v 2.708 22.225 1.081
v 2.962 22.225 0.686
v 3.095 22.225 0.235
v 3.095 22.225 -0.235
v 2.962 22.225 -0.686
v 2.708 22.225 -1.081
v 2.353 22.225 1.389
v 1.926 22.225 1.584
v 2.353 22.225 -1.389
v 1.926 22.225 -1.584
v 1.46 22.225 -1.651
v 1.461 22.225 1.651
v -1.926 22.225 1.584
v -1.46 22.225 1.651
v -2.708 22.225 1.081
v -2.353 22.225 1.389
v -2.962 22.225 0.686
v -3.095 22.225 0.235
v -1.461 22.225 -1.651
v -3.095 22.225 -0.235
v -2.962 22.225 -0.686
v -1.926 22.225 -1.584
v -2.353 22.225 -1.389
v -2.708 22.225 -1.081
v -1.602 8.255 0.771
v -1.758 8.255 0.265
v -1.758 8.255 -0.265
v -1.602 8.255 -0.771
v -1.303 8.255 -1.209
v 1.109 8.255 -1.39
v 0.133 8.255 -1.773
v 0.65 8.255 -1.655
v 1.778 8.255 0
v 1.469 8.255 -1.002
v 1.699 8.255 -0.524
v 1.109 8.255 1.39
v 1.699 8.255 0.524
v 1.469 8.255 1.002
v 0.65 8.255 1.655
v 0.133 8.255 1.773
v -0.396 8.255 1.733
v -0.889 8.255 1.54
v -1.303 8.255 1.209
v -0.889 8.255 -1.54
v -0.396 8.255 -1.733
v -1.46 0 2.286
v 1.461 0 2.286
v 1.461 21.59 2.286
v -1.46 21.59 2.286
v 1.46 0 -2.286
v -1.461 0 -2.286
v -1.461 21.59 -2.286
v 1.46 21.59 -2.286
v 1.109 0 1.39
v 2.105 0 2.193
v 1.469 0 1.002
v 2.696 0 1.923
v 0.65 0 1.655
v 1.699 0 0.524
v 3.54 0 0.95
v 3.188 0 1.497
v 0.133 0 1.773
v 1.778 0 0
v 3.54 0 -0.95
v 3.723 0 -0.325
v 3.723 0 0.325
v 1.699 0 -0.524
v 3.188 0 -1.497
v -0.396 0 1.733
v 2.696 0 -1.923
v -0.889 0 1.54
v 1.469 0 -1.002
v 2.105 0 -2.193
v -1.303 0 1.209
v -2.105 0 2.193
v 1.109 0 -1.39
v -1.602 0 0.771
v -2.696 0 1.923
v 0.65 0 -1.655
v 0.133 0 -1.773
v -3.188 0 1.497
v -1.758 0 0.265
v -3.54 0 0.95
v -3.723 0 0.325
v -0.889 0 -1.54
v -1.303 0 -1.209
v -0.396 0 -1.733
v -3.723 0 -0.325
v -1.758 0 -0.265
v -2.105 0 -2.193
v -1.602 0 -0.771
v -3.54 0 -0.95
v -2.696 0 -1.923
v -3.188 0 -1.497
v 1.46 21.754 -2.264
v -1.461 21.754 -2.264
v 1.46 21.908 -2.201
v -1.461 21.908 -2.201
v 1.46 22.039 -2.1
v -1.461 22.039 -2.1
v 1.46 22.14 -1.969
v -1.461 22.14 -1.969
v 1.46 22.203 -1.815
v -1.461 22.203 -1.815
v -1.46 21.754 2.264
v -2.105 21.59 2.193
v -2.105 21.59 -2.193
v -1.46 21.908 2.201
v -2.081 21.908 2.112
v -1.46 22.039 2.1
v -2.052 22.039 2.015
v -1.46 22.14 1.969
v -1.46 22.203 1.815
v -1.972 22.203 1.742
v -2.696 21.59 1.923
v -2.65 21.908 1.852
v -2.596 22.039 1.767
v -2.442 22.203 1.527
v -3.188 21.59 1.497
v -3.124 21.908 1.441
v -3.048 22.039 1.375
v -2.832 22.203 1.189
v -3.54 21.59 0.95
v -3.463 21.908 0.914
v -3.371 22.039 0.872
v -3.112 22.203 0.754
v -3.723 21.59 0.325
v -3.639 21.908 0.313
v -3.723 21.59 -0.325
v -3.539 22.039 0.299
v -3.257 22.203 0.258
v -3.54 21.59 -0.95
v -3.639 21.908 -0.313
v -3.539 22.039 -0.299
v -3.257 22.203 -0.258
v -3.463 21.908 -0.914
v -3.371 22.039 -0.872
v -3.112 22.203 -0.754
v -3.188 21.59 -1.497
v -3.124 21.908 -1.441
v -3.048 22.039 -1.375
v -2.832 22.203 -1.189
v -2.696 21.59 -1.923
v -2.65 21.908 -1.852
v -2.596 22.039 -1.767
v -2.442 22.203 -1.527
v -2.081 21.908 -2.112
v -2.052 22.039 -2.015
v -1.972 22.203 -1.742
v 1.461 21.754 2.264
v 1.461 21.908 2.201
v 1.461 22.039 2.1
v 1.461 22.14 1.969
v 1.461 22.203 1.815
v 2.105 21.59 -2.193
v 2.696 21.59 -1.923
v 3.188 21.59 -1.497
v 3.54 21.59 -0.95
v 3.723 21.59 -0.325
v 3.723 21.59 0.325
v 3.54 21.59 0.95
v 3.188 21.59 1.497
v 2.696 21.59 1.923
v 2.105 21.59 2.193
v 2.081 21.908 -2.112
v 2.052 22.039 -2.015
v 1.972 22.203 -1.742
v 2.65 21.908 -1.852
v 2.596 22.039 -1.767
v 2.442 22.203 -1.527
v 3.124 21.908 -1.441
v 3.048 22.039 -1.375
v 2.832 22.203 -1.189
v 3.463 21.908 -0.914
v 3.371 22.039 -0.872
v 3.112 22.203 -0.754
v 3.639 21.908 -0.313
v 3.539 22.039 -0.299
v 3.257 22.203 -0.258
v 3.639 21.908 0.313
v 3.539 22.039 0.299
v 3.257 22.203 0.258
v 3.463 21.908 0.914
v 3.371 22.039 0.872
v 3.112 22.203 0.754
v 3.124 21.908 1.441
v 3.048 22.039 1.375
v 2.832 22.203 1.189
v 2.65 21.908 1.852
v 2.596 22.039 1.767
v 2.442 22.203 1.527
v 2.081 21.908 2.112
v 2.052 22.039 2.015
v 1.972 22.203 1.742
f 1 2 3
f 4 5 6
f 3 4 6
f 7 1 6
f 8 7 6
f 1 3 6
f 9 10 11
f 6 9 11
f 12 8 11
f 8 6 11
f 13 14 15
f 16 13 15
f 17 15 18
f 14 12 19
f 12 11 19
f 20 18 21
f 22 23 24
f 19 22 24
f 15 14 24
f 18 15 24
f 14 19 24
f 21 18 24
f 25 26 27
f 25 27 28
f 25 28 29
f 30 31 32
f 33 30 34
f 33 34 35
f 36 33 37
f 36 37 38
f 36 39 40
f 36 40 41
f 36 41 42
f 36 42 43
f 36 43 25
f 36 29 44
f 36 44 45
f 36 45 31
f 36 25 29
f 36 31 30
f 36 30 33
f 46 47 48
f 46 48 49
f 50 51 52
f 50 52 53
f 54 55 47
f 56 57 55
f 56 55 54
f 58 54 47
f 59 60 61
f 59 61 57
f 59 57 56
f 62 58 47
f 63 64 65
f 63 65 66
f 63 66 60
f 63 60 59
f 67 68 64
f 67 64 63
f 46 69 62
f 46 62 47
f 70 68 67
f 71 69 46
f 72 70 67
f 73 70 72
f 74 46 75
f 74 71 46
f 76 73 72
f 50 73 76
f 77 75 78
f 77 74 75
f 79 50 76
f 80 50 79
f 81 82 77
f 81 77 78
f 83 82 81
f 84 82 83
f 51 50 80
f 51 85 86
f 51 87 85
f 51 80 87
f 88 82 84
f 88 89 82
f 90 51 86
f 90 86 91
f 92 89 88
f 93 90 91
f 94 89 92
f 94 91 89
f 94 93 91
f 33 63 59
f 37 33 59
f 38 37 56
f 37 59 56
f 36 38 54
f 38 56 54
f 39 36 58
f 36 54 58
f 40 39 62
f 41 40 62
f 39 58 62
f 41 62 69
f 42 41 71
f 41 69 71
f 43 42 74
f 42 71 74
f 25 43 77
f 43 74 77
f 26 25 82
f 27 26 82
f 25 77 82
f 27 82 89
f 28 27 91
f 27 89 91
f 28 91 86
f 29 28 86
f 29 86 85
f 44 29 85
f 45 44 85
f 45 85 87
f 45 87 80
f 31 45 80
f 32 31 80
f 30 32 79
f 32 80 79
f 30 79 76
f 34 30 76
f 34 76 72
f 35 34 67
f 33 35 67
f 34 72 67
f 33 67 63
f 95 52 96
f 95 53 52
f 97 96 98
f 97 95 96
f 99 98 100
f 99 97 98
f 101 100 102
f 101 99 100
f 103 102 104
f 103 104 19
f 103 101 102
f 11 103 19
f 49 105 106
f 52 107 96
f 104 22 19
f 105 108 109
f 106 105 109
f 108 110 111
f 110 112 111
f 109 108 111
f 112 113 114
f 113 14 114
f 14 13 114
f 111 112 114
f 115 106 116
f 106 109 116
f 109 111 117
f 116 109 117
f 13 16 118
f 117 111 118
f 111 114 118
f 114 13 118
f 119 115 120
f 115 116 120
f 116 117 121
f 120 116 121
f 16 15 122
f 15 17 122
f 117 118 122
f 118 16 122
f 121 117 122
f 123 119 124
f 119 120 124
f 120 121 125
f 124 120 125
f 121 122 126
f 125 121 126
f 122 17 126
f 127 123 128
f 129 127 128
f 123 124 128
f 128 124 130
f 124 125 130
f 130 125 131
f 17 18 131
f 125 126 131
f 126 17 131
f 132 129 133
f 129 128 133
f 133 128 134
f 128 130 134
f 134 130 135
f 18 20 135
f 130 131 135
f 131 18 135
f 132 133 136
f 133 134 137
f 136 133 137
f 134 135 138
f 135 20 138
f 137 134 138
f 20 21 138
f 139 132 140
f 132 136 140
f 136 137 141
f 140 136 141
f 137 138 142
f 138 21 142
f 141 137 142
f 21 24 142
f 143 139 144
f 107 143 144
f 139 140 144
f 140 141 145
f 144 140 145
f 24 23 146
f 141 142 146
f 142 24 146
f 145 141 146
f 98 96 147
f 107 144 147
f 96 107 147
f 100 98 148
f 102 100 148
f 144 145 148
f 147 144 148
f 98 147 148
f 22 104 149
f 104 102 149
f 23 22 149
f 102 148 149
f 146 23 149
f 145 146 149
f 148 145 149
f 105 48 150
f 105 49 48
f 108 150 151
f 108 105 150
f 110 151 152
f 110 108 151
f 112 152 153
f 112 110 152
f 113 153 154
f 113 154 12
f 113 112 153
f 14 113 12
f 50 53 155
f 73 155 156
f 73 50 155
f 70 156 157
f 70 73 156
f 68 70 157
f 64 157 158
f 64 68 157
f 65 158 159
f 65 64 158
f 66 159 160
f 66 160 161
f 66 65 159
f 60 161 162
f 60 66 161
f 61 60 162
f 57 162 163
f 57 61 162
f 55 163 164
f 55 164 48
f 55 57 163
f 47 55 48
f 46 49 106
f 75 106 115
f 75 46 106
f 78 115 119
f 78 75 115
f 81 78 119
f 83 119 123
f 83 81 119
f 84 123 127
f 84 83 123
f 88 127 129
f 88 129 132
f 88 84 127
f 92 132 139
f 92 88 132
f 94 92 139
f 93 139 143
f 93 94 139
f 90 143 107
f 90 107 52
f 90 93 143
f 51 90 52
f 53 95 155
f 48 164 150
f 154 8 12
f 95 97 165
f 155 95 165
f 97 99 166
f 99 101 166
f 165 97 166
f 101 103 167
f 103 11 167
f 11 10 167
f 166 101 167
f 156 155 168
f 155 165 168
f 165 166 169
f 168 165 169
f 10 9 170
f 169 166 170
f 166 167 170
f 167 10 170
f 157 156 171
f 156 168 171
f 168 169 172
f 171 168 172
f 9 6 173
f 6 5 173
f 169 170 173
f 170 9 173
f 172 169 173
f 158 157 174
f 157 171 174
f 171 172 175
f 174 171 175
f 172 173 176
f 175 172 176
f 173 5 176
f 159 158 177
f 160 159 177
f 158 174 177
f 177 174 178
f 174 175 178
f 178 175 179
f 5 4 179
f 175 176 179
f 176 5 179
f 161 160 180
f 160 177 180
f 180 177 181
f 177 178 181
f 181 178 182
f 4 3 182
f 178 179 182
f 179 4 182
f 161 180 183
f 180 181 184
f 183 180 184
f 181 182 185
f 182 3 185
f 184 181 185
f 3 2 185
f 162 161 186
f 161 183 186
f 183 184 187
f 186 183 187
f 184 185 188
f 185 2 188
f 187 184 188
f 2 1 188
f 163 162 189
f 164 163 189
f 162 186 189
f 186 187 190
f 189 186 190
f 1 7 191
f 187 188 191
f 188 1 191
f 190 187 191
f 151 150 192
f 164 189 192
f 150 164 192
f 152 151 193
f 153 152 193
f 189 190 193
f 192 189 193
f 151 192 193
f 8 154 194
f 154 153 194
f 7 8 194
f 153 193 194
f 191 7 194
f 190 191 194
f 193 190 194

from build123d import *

# Parameters (mm, degrees)
BOSS_EXTRUDE1_DEPTH = 22.225
FILLET1_R           = 0.635
SKETCH2_R           = 1.778
CUT_EXTRUDE3_DEPTH  = 8.255


with BuildPart() as part:
    # Sketch1 → Boss-Extrude1 (new body)
    with BuildSketch(Plane(origin=(0, 0, 0), x_dir=(1, 0, 0), z_dir=(0, 1, 0))):
        with BuildLine():
            Line((-1.4605, 2.286), (1.4605, 2.286))
            ThreePointArc((1.4605, 2.286), (3.7465, 0), (1.4605, -2.286))
            Line((1.4605, -2.286), (-1.4605, -2.286))
            ThreePointArc((-1.4605, -2.286), (-3.7465, 0), (-1.4605, 2.286))
        make_face()
    extrude(amount=BOSS_EXTRUDE1_DEPTH)

    # Fillet1
    fillet1_edges = [part.edges().sort_by_distance(p)[0] for p in [
        (3.7465, 22.225, 0),
        (0, 22.225, -2.286),
        (-3.7465, 22.225, 0),
        (0, 22.225, 2.286),
    ]]
    fillet(fillet1_edges, radius=FILLET1_R)

    # Sketch2 → Cut-Extrude3 (cut)
    with BuildSketch(Plane.XZ):
        Circle(SKETCH2_R)
    extrude(amount=-CUT_EXTRUDE3_DEPTH, mode=Mode.SUBTRACT)


solid = part.part
